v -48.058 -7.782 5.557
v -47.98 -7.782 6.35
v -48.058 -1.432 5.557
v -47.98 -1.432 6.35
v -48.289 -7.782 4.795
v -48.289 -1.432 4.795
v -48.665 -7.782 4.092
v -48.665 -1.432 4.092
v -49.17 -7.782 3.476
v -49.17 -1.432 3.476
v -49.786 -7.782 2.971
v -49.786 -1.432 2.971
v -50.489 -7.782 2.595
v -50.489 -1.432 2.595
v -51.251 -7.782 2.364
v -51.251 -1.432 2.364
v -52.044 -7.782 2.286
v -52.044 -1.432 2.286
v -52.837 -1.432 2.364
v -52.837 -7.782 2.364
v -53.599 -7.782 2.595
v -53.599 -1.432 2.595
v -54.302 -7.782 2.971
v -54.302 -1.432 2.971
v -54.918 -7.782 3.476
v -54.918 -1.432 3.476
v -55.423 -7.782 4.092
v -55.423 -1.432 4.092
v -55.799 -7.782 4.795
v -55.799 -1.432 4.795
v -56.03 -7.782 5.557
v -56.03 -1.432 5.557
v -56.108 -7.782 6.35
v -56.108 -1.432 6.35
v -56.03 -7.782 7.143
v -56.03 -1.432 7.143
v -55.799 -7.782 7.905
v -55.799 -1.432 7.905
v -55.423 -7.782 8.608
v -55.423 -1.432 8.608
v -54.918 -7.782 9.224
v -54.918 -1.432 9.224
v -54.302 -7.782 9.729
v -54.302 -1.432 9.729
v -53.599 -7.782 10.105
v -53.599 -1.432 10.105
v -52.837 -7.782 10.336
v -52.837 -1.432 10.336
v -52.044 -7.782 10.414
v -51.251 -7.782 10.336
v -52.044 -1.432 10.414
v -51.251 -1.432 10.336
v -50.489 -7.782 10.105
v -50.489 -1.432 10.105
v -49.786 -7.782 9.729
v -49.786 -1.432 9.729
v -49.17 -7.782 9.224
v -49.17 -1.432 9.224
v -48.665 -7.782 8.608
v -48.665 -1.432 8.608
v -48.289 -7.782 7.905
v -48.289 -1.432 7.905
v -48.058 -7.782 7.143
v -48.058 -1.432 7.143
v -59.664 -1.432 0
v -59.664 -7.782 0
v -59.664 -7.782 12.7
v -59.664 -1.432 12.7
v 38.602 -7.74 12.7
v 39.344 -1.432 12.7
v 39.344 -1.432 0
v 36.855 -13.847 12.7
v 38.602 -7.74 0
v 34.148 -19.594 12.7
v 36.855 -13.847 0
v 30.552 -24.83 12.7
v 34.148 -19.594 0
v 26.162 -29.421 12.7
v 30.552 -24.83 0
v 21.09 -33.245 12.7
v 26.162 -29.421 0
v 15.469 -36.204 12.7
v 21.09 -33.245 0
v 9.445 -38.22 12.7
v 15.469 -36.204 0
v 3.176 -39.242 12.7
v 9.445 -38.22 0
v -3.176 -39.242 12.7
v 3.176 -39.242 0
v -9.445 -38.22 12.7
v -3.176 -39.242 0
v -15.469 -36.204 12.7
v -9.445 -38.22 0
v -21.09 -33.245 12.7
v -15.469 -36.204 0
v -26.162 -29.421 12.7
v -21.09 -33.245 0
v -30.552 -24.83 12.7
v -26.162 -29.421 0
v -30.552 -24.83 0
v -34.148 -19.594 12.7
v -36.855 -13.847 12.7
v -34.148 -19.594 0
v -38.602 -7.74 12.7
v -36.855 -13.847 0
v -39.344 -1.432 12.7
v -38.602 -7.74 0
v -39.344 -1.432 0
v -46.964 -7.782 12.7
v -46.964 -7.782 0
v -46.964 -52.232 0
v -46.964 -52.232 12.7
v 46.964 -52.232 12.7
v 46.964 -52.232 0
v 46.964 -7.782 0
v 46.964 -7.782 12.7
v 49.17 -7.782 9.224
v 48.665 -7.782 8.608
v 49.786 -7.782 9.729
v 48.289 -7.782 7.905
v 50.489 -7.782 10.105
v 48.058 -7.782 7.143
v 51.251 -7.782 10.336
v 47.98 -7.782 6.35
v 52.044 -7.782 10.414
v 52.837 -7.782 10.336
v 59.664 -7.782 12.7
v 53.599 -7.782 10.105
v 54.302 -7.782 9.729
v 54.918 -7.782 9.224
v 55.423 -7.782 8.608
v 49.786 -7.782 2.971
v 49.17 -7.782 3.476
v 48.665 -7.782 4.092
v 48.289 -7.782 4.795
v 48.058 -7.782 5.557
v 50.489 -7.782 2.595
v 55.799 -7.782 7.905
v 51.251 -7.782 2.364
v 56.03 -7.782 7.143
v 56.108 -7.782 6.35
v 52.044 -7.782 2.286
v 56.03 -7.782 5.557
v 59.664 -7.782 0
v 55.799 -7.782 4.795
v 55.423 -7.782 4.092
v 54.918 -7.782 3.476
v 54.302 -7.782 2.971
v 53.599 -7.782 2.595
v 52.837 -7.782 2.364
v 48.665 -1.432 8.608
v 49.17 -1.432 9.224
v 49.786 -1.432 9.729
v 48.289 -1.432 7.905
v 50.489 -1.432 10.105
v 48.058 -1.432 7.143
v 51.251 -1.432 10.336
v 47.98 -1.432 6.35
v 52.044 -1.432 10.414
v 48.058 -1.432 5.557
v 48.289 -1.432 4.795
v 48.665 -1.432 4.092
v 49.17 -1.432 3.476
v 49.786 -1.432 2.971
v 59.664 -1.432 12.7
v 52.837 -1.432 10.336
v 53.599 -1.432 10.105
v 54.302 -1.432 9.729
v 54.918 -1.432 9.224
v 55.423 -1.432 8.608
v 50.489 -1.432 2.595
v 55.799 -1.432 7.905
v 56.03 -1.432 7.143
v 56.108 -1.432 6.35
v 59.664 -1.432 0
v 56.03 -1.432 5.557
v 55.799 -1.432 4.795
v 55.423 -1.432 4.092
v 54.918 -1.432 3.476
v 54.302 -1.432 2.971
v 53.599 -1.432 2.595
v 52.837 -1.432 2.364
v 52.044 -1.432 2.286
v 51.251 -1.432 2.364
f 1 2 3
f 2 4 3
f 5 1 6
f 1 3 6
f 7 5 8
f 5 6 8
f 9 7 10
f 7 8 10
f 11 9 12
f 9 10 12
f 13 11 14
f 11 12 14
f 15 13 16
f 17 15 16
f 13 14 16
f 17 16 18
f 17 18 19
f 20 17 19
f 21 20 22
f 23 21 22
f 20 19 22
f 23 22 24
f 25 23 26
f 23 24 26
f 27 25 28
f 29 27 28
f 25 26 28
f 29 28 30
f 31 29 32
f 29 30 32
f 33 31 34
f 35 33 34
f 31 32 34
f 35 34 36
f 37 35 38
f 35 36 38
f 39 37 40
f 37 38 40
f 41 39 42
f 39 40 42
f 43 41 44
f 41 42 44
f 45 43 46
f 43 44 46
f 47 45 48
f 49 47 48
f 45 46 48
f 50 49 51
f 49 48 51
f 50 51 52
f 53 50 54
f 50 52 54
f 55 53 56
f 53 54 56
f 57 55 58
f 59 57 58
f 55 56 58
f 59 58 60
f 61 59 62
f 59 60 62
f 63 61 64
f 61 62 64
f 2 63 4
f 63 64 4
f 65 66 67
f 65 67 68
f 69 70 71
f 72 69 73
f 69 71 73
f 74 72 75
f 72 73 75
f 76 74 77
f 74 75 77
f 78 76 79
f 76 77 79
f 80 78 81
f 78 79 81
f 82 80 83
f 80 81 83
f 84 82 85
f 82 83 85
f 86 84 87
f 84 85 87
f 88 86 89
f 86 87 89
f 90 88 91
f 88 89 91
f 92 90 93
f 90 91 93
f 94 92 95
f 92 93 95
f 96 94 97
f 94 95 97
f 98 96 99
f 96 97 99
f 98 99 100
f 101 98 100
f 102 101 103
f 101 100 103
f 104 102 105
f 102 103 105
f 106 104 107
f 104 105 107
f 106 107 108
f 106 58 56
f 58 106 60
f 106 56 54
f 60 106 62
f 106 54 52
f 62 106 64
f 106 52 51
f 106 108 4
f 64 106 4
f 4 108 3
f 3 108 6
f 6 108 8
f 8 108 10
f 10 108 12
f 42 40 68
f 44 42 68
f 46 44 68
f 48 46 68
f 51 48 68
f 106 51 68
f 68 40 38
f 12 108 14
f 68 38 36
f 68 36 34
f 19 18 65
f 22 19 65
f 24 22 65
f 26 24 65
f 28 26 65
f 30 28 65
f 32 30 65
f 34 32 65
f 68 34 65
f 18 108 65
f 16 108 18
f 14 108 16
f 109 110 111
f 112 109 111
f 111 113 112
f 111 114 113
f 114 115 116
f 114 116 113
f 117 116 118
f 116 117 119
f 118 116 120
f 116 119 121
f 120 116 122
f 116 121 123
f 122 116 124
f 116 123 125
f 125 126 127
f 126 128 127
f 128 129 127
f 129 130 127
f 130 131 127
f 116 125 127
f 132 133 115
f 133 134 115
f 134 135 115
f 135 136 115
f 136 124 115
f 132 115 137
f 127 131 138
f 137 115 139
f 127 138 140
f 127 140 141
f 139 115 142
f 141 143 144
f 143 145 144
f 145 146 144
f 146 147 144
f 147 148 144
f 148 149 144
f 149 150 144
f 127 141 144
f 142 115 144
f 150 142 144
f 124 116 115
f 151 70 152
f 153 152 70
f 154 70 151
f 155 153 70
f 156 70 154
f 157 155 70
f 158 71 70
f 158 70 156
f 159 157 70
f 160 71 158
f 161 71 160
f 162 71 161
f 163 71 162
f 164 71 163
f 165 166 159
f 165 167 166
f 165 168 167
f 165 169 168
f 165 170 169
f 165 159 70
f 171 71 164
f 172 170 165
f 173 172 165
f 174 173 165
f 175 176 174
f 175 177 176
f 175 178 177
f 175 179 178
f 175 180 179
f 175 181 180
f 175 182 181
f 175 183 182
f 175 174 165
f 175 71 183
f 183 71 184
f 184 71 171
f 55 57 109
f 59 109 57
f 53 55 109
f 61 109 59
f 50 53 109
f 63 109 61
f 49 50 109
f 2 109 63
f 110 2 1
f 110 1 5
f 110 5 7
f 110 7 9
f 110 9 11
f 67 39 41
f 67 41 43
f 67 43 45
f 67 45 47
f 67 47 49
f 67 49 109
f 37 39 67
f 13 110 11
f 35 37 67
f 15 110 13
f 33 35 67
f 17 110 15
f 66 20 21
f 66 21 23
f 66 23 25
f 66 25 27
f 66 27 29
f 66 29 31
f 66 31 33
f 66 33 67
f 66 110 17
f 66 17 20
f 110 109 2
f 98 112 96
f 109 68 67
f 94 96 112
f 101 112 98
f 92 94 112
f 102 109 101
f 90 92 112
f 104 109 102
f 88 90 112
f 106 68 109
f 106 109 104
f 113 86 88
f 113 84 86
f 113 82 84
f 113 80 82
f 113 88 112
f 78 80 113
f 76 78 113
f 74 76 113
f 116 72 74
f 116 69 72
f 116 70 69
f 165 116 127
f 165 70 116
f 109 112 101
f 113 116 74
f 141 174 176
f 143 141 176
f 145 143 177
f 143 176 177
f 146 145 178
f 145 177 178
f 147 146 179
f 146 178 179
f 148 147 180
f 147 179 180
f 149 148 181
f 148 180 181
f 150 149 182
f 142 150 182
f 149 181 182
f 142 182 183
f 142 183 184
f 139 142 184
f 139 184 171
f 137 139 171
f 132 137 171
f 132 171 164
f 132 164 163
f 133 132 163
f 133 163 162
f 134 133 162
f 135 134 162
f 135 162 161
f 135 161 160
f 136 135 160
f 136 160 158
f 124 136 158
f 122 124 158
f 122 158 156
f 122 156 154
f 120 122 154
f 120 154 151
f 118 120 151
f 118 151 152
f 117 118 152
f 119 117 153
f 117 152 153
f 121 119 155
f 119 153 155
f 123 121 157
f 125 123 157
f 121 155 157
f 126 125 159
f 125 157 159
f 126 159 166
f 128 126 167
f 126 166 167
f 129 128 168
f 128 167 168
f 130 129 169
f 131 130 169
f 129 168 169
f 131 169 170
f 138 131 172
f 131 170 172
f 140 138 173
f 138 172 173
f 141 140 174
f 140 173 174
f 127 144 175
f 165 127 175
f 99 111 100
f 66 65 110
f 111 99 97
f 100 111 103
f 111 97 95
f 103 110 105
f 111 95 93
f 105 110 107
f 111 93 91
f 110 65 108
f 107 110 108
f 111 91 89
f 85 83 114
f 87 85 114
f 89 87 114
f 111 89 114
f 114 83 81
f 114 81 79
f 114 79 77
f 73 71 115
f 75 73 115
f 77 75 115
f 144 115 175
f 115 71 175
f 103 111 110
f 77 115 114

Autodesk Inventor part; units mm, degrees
ref_plane "YZ Plane" through (0, 0, 0) normal (1, 0, 0) x (0, 1, 0)
ref_plane "XZ Plane" through (0, 0, 0) normal (0, 1, 0) x (-1, 0, 0)
ref_plane "XY Plane" through (0, 0, 0) normal (0, 0, 1) x (1, 0, 0)
sketch "Sketch1" plane through (0, 0, 0) normal (0, 0, 1) x (1, 0, 0)
  arc A0 (-39.344, -1.4316) -> (39.344, -1.4316) centre (0, 0) ccw
  line L0 (-39.344, -1.4316) -> (-39.3671, -1.4316)
  line L1 (-39.344, -1.4316) -> (-52.044, -1.4316)
  line L2 (39.344, -1.4316) -> (52.044, -1.4316)
  arc A1 (-46.964, -22.4724) -> (46.964, -22.4724) centre (0, 0) ccw
  line L3 (-52.044, -1.4316) -> (-59.664, -1.4316)
  line L4 (52.044, -1.4316) -> (59.664, -1.4316)
  line L5 (39.344, -1.4316) -> (46.964, -1.4316)
  line L6 (46.964, -1.4316) -> (46.964, -22.4724)
  line L7 (-39.344, -1.4316) -> (-45.694, -1.4316)
  line L8 (-39.344, -1.4316) -> (-46.964, -1.4316)
  line L9 (-46.964, -1.4316) -> (-46.964, -22.4724)
  line L10 (-46.964, -7.7816) -> (-59.664, -7.7816)
  line L11 (-59.664, -7.7816) -> (-59.664, -1.4316)
  line L12 (46.964, -7.7816) -> (59.664, -7.7816)
  line L13 (59.664, -7.7816) -> (59.664, -1.4316)
  line L14 (46.964, -42.5386) -> (30.0181, -42.5386)
  line L15 (46.964, -22.4724) -> (46.964, -42.5386)
  line L16 (46.964, -42.5386) -> (-46.964, -42.5386)
  line L17 (-46.964, -42.5386) -> (-46.964, -22.4724)
  line L18 (-46.964, -42.5386) -> (46.964, -42.5386)
  line L19 (46.964, -42.5386) -> (46.964, -52.2316)
  line L20 (46.964, -52.2316) -> (-46.964, -52.2316)
  line L21 (-46.964, -52.2316) -> (-46.964, -42.5386)
  line L22 (-46.964, -22.4724) -> (-32.3263, -22.4724)
  line L23 (32.3263, -22.4724) -> (46.964, -22.4724)
  dimension "d0" = 78.74
  dimension "d1" = 12.7
  dimension "d2" = 12.7
  dimension "d4" = 7.62
  dimension "d5" = 7.62
  dimension "d6" = 7.62
  dimension "d7" = 7.62
  dimension "d8" = 6.35
  dimension "d9" = 6.35
  dimension "d20" = 50.8
extrude "Extrusion1" add sketch "Sketch1" along normal blind 12.7
sketch "Sketch2" plane through (-59.664, -1.4316, 0) normal (0, 1, 0) x (1, 0, 0)
  line L0 (20.32, 0) -> (0, 0) projected
  line L1 (0, 0) -> (20.32, 0)
  circle A0 centre (7.62, -6.35) radius 4.064
  circle A1 centre (111.7079, -6.35) radius 4.064
  line L2 (99.0079, 0) -> (99.0079, -12.7) projected
  line L3 (20.32, 0) -> (20.32, -12.7) projected
  point P0 (59.664, 0)
  dimension "d14" = 12.7
  dimension "d15" = 12.7
  dimension "d16" = 8.128
  dimension "d17" = 8.128
extrude "Extrusion2" cut sketch "Sketch2" against normal blind 25.4
properties part number "MOTOR MOUNT REAL TOP E3O MOTOR"
